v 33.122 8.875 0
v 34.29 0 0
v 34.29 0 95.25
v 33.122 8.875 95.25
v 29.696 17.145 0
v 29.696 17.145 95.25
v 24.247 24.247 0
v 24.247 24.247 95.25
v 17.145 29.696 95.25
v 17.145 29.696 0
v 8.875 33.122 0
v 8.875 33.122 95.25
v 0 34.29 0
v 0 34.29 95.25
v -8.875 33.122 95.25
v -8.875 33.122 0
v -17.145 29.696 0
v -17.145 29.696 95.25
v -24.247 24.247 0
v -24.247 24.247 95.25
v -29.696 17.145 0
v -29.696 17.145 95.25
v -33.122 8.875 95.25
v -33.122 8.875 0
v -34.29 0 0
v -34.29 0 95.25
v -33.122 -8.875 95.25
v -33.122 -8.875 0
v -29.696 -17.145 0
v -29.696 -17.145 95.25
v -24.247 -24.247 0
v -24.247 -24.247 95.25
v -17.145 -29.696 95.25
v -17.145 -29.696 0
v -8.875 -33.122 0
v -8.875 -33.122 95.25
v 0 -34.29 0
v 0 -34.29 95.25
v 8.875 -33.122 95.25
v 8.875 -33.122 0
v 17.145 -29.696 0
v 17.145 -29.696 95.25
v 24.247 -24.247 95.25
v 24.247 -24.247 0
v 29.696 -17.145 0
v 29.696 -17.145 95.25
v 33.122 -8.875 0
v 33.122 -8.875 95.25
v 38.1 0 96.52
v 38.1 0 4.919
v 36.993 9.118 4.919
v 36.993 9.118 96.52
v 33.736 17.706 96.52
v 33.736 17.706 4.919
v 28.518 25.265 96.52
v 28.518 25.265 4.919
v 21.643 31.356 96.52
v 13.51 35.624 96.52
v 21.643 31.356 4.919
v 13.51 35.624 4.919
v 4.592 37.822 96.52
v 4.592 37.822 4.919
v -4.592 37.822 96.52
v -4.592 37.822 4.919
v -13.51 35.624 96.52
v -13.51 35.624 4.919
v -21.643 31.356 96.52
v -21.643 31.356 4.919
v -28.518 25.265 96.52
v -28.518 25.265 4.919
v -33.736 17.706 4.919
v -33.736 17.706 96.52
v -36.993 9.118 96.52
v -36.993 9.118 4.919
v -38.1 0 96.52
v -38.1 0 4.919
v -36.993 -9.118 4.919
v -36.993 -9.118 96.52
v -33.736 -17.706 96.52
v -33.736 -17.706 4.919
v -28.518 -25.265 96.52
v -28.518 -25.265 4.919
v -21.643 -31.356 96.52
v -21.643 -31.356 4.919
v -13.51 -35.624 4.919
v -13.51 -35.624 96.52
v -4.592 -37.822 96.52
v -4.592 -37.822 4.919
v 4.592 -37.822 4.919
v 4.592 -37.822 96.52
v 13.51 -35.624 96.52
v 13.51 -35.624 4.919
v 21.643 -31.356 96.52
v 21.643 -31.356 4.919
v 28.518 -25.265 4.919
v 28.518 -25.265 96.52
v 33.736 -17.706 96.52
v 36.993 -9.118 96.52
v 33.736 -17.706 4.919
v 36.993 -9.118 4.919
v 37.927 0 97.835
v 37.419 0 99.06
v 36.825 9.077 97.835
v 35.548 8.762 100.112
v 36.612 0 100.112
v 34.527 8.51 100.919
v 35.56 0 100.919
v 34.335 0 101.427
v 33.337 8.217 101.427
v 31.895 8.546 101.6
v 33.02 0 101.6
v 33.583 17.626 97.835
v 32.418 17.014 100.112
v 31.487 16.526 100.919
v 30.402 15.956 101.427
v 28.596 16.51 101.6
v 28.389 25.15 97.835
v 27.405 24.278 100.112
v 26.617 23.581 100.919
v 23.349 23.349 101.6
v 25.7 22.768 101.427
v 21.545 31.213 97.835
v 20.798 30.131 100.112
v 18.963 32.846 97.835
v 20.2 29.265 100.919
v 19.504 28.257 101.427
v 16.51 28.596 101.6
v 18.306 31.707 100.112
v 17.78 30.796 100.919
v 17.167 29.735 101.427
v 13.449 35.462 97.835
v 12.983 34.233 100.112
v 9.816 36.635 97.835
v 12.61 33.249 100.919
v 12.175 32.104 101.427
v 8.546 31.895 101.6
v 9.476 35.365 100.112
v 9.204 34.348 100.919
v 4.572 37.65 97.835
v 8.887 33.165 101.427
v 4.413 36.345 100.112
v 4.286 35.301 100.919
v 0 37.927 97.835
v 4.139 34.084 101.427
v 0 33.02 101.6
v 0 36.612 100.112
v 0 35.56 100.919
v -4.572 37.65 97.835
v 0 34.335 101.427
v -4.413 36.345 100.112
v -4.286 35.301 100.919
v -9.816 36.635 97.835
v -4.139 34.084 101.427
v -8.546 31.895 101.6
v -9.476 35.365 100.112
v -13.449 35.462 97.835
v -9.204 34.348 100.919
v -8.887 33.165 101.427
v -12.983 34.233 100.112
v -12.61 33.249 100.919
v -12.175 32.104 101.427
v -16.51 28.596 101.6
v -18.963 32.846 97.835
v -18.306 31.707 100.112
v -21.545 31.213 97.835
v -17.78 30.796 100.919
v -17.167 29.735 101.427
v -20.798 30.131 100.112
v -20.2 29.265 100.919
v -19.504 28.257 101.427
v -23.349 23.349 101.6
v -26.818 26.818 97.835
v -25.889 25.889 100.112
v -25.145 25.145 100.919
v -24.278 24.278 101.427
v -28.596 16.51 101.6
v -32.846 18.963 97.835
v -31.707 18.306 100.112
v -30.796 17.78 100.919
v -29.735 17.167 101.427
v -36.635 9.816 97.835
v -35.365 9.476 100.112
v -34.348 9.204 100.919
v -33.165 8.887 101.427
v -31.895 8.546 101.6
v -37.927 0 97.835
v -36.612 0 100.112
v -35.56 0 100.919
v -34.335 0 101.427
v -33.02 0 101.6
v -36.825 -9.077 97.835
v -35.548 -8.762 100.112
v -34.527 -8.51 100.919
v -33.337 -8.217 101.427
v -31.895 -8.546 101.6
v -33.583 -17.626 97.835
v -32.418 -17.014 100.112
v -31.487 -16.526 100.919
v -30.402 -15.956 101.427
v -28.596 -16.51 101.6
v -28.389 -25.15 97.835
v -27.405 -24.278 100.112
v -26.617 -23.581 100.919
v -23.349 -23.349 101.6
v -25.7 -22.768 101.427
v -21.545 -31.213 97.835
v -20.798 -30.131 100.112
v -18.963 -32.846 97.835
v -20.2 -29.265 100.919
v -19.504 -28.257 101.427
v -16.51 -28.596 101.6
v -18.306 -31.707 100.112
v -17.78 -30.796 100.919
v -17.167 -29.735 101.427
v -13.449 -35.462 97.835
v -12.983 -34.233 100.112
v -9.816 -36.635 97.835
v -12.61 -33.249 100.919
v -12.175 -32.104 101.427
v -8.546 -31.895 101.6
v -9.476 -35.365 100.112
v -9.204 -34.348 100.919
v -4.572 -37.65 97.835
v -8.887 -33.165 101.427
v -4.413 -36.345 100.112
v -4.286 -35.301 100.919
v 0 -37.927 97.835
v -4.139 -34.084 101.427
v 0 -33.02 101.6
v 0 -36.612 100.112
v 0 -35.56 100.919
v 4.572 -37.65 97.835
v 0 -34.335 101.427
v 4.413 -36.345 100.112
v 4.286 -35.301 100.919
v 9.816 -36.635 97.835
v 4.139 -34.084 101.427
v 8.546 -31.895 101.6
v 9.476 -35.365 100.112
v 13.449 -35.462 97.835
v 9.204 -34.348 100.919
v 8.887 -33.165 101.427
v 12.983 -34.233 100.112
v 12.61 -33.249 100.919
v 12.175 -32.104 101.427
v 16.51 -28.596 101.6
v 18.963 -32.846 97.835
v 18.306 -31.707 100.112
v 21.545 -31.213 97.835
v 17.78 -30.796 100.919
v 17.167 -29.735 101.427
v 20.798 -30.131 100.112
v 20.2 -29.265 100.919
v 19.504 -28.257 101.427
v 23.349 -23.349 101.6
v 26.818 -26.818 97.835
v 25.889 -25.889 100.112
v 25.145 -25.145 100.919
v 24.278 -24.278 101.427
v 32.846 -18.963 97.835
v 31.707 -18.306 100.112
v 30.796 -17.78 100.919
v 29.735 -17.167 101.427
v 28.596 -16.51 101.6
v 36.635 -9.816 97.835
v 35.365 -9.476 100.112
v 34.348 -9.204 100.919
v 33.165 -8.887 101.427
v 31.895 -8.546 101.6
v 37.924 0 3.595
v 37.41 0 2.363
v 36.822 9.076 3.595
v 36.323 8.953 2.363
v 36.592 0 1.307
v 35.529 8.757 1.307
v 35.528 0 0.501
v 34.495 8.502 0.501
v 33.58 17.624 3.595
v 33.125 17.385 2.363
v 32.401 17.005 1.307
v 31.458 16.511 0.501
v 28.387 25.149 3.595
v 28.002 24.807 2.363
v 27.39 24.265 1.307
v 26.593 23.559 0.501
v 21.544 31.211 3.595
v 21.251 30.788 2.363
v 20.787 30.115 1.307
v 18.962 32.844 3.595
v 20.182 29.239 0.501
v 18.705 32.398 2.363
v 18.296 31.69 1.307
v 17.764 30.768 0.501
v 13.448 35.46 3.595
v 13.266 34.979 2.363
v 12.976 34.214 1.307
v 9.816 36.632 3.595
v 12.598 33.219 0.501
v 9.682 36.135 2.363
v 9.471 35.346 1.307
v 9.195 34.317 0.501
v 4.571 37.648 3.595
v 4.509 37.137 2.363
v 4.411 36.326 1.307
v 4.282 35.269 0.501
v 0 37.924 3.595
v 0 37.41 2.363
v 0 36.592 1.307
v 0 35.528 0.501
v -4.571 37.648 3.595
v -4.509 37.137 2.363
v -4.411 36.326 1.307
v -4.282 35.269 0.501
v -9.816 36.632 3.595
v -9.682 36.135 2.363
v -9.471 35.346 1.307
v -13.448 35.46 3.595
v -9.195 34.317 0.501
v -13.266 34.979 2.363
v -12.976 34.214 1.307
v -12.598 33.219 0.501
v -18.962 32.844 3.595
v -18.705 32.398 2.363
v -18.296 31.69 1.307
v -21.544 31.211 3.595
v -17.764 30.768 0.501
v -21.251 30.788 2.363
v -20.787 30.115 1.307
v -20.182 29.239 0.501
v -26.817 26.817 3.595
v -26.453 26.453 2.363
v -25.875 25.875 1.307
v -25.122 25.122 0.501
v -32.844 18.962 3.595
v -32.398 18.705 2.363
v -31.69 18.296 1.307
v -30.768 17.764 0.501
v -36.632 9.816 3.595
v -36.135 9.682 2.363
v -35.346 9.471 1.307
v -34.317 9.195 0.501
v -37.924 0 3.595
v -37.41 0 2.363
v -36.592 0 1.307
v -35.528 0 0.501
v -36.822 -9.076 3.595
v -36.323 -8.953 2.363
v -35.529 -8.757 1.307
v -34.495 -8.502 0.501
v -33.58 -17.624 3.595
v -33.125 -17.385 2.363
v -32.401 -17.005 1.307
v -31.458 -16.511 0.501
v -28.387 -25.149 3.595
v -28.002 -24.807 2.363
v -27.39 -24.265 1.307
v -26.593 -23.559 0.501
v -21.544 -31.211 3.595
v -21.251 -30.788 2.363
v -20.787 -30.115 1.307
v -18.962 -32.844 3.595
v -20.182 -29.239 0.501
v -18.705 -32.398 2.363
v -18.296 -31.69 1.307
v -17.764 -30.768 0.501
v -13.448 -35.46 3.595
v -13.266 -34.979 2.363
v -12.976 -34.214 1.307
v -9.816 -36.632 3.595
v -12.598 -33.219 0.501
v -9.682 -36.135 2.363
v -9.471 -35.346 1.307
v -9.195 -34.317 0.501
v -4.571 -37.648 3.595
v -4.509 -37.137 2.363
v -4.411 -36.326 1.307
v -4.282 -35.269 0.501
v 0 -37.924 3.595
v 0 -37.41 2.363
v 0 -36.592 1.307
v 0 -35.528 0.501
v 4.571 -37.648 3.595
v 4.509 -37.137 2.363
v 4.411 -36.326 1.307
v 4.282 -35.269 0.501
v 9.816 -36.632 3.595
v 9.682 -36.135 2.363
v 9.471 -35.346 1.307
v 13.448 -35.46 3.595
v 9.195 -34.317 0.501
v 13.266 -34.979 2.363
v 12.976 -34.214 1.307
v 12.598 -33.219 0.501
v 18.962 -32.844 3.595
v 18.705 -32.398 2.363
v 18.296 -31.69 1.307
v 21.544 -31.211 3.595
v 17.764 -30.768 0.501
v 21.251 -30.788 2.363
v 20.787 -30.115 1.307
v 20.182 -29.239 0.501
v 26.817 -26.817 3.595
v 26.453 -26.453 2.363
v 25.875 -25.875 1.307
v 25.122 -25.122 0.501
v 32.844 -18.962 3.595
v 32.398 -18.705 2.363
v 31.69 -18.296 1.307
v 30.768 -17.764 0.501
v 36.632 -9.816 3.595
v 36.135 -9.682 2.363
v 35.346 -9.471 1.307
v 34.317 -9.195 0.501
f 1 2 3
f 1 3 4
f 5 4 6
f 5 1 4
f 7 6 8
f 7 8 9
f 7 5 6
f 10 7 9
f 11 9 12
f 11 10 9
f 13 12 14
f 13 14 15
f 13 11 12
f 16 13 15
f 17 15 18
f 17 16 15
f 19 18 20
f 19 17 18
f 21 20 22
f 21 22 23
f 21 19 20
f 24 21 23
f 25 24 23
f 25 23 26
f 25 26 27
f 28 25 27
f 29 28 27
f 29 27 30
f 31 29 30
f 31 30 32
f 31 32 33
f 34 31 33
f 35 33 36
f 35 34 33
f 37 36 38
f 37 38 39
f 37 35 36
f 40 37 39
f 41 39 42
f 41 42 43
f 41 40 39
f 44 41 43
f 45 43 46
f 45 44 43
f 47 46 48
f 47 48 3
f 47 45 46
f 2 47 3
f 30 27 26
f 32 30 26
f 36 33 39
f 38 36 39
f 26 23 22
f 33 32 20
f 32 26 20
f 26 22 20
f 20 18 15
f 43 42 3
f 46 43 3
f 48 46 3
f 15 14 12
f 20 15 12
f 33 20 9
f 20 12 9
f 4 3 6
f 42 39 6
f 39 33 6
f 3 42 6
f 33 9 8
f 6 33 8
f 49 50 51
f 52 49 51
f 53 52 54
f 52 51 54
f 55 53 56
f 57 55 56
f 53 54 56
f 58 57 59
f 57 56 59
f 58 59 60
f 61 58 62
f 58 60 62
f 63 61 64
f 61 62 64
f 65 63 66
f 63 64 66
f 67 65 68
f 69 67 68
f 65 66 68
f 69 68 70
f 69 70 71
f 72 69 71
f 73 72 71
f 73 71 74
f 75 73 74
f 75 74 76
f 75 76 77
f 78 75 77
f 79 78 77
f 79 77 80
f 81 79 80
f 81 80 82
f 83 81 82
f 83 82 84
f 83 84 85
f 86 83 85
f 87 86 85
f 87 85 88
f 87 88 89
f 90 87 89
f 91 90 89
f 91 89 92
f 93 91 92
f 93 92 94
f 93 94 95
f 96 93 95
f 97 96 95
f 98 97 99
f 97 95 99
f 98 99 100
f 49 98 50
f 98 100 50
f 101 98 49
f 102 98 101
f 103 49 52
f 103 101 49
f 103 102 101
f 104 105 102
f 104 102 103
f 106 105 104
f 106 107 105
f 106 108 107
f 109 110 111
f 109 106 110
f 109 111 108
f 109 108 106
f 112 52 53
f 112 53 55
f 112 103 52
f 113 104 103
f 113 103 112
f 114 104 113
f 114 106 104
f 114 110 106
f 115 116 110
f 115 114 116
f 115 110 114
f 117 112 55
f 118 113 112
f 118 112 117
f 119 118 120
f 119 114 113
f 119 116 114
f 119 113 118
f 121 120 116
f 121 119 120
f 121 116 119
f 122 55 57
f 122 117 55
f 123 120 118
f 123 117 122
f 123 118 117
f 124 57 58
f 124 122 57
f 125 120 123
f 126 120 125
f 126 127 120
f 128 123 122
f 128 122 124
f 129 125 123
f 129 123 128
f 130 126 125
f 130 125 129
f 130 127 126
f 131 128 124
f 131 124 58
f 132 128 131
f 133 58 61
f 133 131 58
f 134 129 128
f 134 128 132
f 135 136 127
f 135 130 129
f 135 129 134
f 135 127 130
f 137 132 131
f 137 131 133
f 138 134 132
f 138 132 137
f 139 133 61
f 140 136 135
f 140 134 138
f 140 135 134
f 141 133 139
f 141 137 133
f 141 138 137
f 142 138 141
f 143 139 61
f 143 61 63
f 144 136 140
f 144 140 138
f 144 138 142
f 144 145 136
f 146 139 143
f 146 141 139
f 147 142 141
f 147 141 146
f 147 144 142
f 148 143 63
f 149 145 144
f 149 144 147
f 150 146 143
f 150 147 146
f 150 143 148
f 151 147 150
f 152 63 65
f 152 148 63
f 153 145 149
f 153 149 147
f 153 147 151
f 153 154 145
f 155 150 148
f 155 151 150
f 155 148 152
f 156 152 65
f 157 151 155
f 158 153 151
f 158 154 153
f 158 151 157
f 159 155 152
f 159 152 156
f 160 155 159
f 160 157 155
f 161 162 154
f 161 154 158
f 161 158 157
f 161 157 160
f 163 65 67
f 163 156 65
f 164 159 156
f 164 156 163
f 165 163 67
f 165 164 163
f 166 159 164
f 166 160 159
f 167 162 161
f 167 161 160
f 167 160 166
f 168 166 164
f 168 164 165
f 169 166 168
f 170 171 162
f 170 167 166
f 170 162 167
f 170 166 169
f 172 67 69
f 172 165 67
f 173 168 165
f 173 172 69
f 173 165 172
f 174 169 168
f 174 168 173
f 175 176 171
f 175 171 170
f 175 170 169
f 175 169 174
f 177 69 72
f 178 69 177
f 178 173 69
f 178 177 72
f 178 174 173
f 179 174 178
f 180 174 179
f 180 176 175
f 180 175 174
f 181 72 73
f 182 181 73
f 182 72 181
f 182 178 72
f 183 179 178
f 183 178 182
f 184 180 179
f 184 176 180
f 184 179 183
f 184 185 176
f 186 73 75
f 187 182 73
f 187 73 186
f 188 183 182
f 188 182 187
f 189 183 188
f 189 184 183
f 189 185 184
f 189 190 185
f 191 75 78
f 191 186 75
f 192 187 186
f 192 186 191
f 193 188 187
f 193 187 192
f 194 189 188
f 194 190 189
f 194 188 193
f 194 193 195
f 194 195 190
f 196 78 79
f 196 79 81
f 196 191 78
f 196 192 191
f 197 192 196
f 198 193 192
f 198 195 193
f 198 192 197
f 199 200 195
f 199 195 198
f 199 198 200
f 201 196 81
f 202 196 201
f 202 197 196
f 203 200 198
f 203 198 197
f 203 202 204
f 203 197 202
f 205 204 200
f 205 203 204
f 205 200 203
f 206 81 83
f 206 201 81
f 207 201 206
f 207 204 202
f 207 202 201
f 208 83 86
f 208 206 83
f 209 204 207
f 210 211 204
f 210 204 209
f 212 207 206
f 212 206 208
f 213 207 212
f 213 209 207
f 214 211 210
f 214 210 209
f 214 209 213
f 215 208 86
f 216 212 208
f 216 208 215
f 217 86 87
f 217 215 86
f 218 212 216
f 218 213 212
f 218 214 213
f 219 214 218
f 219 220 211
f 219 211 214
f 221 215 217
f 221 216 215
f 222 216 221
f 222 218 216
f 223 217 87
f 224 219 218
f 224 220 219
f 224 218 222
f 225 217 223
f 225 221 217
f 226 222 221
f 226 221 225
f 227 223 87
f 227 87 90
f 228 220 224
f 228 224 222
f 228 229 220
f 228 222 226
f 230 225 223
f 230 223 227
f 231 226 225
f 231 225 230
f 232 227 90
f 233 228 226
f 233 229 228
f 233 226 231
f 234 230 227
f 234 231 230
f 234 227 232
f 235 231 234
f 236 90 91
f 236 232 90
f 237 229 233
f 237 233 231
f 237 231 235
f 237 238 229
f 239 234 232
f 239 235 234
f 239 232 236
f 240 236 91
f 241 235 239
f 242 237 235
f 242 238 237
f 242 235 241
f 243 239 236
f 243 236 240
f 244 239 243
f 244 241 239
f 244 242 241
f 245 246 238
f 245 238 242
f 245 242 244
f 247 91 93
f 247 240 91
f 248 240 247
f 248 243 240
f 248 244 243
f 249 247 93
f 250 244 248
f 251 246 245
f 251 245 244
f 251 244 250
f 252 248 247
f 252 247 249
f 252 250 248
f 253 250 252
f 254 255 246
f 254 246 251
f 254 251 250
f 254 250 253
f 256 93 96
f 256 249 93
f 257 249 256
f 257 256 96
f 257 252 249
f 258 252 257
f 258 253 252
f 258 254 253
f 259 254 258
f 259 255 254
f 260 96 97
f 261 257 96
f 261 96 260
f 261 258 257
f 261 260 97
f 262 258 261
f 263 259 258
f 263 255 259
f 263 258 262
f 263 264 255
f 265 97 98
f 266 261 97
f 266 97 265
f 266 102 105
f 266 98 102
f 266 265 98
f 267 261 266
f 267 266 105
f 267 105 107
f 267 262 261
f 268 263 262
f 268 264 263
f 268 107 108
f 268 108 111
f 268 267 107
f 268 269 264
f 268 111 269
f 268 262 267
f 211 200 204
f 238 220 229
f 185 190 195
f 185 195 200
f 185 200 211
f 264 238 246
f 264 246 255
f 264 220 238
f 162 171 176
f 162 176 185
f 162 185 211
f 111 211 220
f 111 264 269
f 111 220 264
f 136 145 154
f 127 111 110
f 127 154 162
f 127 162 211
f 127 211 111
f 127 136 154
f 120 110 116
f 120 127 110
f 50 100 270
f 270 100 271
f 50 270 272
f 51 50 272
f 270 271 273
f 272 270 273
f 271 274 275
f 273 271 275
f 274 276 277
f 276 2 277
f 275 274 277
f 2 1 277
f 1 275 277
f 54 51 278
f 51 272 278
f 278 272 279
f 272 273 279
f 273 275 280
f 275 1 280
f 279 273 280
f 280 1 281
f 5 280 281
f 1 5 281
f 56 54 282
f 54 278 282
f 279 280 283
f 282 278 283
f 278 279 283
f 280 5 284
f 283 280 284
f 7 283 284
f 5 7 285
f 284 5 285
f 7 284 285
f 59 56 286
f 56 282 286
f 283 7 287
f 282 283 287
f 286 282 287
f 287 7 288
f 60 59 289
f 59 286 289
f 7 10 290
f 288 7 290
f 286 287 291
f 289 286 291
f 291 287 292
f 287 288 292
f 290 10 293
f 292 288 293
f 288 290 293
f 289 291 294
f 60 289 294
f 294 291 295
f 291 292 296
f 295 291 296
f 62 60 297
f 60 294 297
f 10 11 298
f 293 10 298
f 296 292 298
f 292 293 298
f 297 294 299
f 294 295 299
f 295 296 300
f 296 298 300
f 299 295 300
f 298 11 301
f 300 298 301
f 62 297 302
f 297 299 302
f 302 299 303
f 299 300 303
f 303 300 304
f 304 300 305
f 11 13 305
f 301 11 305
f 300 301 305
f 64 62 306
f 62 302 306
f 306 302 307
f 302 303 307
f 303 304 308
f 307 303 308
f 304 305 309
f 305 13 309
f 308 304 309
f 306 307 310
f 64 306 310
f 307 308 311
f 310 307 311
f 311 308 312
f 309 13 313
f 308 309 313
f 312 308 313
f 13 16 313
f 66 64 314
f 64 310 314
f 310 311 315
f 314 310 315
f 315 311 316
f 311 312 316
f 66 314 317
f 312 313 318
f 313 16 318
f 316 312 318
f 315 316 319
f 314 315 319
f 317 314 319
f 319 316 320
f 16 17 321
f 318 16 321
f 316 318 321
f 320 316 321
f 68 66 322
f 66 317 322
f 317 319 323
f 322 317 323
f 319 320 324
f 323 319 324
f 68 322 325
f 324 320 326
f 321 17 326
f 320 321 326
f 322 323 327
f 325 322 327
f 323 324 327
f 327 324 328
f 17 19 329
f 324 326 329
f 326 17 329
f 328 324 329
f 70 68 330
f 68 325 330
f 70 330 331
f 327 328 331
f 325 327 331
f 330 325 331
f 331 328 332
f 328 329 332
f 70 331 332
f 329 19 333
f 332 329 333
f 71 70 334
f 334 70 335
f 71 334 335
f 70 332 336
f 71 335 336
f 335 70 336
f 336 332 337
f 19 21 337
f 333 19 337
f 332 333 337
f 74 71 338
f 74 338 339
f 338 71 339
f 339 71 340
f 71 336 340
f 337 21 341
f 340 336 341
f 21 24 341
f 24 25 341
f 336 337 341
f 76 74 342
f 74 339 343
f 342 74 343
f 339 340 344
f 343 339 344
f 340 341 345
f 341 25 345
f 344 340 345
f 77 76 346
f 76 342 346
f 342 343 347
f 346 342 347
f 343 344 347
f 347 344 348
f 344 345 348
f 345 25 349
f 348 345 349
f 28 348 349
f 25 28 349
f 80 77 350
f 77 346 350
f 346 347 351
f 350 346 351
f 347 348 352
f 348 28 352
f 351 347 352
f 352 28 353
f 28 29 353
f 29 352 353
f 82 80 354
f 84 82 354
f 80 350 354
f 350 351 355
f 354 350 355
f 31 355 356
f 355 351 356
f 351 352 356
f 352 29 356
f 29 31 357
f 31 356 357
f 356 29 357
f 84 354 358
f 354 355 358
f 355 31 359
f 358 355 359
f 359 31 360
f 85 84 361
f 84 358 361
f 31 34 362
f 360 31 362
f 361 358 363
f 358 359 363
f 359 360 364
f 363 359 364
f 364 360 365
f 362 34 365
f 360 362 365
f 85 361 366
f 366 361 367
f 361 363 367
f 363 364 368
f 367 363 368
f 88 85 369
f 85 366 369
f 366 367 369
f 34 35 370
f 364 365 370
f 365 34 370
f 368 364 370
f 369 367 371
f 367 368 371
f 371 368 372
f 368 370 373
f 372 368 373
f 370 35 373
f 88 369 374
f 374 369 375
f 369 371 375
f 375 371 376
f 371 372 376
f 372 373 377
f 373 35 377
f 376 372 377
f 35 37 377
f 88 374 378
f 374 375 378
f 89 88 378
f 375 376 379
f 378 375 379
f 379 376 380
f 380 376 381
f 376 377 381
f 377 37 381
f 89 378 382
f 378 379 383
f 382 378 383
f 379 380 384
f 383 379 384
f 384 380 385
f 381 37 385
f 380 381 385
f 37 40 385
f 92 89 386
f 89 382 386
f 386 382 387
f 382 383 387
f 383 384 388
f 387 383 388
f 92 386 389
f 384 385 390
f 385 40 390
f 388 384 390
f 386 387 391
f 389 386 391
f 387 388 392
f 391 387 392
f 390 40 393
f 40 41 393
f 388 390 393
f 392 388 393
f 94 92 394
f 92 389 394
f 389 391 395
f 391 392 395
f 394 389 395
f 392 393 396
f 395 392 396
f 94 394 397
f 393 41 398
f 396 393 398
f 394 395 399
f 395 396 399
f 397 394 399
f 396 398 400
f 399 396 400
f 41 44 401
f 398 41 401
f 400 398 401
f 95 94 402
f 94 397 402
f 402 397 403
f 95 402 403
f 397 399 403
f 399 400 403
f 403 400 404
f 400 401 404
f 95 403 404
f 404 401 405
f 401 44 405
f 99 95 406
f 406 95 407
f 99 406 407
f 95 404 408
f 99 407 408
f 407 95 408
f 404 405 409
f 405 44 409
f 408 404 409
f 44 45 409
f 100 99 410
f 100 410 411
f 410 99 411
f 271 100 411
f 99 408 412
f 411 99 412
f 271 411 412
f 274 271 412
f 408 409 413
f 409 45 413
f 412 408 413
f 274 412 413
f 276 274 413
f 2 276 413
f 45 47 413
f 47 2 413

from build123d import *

# Parameters (mm, degrees)
F0_R     = 38.1
F1_DEPTH = 101.6
F2_R     = 34.29
F3_DEPTH = 95.25


# Not quite as in the source:
# - a fillet or chamfer that OpenCascade refuses, or shapes differently, is made with other operations: its cross-section is extruded or revolved along the edge and cut away or added


with BuildPart() as f1:
    # F0 (on Top) → F1 (new body)
    with BuildSketch(Plane.XY):
        Circle(F0_R)
    extrude(amount=F1_DEPTH)

    # F2 (on Top) → F3 (cut)
    with BuildSketch(Plane.XY):
        Circle(F2_R)
    extrude(amount=F3_DEPTH, mode=Mode.SUBTRACT)

    # F4: fillet of radius 5.08 on 2 edges, made by hand

    # F4_s1 → F4_t2 (revolve, cut)
    with BuildSketch(Plane.XZ):
        with BuildLine():
            ThreePointArc((38.1, 4.9186888497), (37.0360926284, 1.8078368763), (34.29, 0))
            Line((34.29, 0), (38.1, 0))
            Line((38.1, 0), (38.1, 4.9186888497))
        make_face()
    revolve(axis=Axis((0, 0, 0), (0, 0, 1)), mode=Mode.SUBTRACT)

    # F4_s3 → F4_t4 (revolve, cut)
    with BuildSketch(Plane.XZ):
        with BuildLine():
            ThreePointArc((38.1, 96.52), (36.6121024484, 100.1121024484), (33.02, 101.6))
            Line((33.02, 101.6), (38.1, 101.6))
            Line((38.1, 101.6), (38.1, 96.52))
        make_face()
    revolve(axis=Axis((0, 0, 101.6), (0, 0, 1)), mode=Mode.SUBTRACT)


solid = f1.part
